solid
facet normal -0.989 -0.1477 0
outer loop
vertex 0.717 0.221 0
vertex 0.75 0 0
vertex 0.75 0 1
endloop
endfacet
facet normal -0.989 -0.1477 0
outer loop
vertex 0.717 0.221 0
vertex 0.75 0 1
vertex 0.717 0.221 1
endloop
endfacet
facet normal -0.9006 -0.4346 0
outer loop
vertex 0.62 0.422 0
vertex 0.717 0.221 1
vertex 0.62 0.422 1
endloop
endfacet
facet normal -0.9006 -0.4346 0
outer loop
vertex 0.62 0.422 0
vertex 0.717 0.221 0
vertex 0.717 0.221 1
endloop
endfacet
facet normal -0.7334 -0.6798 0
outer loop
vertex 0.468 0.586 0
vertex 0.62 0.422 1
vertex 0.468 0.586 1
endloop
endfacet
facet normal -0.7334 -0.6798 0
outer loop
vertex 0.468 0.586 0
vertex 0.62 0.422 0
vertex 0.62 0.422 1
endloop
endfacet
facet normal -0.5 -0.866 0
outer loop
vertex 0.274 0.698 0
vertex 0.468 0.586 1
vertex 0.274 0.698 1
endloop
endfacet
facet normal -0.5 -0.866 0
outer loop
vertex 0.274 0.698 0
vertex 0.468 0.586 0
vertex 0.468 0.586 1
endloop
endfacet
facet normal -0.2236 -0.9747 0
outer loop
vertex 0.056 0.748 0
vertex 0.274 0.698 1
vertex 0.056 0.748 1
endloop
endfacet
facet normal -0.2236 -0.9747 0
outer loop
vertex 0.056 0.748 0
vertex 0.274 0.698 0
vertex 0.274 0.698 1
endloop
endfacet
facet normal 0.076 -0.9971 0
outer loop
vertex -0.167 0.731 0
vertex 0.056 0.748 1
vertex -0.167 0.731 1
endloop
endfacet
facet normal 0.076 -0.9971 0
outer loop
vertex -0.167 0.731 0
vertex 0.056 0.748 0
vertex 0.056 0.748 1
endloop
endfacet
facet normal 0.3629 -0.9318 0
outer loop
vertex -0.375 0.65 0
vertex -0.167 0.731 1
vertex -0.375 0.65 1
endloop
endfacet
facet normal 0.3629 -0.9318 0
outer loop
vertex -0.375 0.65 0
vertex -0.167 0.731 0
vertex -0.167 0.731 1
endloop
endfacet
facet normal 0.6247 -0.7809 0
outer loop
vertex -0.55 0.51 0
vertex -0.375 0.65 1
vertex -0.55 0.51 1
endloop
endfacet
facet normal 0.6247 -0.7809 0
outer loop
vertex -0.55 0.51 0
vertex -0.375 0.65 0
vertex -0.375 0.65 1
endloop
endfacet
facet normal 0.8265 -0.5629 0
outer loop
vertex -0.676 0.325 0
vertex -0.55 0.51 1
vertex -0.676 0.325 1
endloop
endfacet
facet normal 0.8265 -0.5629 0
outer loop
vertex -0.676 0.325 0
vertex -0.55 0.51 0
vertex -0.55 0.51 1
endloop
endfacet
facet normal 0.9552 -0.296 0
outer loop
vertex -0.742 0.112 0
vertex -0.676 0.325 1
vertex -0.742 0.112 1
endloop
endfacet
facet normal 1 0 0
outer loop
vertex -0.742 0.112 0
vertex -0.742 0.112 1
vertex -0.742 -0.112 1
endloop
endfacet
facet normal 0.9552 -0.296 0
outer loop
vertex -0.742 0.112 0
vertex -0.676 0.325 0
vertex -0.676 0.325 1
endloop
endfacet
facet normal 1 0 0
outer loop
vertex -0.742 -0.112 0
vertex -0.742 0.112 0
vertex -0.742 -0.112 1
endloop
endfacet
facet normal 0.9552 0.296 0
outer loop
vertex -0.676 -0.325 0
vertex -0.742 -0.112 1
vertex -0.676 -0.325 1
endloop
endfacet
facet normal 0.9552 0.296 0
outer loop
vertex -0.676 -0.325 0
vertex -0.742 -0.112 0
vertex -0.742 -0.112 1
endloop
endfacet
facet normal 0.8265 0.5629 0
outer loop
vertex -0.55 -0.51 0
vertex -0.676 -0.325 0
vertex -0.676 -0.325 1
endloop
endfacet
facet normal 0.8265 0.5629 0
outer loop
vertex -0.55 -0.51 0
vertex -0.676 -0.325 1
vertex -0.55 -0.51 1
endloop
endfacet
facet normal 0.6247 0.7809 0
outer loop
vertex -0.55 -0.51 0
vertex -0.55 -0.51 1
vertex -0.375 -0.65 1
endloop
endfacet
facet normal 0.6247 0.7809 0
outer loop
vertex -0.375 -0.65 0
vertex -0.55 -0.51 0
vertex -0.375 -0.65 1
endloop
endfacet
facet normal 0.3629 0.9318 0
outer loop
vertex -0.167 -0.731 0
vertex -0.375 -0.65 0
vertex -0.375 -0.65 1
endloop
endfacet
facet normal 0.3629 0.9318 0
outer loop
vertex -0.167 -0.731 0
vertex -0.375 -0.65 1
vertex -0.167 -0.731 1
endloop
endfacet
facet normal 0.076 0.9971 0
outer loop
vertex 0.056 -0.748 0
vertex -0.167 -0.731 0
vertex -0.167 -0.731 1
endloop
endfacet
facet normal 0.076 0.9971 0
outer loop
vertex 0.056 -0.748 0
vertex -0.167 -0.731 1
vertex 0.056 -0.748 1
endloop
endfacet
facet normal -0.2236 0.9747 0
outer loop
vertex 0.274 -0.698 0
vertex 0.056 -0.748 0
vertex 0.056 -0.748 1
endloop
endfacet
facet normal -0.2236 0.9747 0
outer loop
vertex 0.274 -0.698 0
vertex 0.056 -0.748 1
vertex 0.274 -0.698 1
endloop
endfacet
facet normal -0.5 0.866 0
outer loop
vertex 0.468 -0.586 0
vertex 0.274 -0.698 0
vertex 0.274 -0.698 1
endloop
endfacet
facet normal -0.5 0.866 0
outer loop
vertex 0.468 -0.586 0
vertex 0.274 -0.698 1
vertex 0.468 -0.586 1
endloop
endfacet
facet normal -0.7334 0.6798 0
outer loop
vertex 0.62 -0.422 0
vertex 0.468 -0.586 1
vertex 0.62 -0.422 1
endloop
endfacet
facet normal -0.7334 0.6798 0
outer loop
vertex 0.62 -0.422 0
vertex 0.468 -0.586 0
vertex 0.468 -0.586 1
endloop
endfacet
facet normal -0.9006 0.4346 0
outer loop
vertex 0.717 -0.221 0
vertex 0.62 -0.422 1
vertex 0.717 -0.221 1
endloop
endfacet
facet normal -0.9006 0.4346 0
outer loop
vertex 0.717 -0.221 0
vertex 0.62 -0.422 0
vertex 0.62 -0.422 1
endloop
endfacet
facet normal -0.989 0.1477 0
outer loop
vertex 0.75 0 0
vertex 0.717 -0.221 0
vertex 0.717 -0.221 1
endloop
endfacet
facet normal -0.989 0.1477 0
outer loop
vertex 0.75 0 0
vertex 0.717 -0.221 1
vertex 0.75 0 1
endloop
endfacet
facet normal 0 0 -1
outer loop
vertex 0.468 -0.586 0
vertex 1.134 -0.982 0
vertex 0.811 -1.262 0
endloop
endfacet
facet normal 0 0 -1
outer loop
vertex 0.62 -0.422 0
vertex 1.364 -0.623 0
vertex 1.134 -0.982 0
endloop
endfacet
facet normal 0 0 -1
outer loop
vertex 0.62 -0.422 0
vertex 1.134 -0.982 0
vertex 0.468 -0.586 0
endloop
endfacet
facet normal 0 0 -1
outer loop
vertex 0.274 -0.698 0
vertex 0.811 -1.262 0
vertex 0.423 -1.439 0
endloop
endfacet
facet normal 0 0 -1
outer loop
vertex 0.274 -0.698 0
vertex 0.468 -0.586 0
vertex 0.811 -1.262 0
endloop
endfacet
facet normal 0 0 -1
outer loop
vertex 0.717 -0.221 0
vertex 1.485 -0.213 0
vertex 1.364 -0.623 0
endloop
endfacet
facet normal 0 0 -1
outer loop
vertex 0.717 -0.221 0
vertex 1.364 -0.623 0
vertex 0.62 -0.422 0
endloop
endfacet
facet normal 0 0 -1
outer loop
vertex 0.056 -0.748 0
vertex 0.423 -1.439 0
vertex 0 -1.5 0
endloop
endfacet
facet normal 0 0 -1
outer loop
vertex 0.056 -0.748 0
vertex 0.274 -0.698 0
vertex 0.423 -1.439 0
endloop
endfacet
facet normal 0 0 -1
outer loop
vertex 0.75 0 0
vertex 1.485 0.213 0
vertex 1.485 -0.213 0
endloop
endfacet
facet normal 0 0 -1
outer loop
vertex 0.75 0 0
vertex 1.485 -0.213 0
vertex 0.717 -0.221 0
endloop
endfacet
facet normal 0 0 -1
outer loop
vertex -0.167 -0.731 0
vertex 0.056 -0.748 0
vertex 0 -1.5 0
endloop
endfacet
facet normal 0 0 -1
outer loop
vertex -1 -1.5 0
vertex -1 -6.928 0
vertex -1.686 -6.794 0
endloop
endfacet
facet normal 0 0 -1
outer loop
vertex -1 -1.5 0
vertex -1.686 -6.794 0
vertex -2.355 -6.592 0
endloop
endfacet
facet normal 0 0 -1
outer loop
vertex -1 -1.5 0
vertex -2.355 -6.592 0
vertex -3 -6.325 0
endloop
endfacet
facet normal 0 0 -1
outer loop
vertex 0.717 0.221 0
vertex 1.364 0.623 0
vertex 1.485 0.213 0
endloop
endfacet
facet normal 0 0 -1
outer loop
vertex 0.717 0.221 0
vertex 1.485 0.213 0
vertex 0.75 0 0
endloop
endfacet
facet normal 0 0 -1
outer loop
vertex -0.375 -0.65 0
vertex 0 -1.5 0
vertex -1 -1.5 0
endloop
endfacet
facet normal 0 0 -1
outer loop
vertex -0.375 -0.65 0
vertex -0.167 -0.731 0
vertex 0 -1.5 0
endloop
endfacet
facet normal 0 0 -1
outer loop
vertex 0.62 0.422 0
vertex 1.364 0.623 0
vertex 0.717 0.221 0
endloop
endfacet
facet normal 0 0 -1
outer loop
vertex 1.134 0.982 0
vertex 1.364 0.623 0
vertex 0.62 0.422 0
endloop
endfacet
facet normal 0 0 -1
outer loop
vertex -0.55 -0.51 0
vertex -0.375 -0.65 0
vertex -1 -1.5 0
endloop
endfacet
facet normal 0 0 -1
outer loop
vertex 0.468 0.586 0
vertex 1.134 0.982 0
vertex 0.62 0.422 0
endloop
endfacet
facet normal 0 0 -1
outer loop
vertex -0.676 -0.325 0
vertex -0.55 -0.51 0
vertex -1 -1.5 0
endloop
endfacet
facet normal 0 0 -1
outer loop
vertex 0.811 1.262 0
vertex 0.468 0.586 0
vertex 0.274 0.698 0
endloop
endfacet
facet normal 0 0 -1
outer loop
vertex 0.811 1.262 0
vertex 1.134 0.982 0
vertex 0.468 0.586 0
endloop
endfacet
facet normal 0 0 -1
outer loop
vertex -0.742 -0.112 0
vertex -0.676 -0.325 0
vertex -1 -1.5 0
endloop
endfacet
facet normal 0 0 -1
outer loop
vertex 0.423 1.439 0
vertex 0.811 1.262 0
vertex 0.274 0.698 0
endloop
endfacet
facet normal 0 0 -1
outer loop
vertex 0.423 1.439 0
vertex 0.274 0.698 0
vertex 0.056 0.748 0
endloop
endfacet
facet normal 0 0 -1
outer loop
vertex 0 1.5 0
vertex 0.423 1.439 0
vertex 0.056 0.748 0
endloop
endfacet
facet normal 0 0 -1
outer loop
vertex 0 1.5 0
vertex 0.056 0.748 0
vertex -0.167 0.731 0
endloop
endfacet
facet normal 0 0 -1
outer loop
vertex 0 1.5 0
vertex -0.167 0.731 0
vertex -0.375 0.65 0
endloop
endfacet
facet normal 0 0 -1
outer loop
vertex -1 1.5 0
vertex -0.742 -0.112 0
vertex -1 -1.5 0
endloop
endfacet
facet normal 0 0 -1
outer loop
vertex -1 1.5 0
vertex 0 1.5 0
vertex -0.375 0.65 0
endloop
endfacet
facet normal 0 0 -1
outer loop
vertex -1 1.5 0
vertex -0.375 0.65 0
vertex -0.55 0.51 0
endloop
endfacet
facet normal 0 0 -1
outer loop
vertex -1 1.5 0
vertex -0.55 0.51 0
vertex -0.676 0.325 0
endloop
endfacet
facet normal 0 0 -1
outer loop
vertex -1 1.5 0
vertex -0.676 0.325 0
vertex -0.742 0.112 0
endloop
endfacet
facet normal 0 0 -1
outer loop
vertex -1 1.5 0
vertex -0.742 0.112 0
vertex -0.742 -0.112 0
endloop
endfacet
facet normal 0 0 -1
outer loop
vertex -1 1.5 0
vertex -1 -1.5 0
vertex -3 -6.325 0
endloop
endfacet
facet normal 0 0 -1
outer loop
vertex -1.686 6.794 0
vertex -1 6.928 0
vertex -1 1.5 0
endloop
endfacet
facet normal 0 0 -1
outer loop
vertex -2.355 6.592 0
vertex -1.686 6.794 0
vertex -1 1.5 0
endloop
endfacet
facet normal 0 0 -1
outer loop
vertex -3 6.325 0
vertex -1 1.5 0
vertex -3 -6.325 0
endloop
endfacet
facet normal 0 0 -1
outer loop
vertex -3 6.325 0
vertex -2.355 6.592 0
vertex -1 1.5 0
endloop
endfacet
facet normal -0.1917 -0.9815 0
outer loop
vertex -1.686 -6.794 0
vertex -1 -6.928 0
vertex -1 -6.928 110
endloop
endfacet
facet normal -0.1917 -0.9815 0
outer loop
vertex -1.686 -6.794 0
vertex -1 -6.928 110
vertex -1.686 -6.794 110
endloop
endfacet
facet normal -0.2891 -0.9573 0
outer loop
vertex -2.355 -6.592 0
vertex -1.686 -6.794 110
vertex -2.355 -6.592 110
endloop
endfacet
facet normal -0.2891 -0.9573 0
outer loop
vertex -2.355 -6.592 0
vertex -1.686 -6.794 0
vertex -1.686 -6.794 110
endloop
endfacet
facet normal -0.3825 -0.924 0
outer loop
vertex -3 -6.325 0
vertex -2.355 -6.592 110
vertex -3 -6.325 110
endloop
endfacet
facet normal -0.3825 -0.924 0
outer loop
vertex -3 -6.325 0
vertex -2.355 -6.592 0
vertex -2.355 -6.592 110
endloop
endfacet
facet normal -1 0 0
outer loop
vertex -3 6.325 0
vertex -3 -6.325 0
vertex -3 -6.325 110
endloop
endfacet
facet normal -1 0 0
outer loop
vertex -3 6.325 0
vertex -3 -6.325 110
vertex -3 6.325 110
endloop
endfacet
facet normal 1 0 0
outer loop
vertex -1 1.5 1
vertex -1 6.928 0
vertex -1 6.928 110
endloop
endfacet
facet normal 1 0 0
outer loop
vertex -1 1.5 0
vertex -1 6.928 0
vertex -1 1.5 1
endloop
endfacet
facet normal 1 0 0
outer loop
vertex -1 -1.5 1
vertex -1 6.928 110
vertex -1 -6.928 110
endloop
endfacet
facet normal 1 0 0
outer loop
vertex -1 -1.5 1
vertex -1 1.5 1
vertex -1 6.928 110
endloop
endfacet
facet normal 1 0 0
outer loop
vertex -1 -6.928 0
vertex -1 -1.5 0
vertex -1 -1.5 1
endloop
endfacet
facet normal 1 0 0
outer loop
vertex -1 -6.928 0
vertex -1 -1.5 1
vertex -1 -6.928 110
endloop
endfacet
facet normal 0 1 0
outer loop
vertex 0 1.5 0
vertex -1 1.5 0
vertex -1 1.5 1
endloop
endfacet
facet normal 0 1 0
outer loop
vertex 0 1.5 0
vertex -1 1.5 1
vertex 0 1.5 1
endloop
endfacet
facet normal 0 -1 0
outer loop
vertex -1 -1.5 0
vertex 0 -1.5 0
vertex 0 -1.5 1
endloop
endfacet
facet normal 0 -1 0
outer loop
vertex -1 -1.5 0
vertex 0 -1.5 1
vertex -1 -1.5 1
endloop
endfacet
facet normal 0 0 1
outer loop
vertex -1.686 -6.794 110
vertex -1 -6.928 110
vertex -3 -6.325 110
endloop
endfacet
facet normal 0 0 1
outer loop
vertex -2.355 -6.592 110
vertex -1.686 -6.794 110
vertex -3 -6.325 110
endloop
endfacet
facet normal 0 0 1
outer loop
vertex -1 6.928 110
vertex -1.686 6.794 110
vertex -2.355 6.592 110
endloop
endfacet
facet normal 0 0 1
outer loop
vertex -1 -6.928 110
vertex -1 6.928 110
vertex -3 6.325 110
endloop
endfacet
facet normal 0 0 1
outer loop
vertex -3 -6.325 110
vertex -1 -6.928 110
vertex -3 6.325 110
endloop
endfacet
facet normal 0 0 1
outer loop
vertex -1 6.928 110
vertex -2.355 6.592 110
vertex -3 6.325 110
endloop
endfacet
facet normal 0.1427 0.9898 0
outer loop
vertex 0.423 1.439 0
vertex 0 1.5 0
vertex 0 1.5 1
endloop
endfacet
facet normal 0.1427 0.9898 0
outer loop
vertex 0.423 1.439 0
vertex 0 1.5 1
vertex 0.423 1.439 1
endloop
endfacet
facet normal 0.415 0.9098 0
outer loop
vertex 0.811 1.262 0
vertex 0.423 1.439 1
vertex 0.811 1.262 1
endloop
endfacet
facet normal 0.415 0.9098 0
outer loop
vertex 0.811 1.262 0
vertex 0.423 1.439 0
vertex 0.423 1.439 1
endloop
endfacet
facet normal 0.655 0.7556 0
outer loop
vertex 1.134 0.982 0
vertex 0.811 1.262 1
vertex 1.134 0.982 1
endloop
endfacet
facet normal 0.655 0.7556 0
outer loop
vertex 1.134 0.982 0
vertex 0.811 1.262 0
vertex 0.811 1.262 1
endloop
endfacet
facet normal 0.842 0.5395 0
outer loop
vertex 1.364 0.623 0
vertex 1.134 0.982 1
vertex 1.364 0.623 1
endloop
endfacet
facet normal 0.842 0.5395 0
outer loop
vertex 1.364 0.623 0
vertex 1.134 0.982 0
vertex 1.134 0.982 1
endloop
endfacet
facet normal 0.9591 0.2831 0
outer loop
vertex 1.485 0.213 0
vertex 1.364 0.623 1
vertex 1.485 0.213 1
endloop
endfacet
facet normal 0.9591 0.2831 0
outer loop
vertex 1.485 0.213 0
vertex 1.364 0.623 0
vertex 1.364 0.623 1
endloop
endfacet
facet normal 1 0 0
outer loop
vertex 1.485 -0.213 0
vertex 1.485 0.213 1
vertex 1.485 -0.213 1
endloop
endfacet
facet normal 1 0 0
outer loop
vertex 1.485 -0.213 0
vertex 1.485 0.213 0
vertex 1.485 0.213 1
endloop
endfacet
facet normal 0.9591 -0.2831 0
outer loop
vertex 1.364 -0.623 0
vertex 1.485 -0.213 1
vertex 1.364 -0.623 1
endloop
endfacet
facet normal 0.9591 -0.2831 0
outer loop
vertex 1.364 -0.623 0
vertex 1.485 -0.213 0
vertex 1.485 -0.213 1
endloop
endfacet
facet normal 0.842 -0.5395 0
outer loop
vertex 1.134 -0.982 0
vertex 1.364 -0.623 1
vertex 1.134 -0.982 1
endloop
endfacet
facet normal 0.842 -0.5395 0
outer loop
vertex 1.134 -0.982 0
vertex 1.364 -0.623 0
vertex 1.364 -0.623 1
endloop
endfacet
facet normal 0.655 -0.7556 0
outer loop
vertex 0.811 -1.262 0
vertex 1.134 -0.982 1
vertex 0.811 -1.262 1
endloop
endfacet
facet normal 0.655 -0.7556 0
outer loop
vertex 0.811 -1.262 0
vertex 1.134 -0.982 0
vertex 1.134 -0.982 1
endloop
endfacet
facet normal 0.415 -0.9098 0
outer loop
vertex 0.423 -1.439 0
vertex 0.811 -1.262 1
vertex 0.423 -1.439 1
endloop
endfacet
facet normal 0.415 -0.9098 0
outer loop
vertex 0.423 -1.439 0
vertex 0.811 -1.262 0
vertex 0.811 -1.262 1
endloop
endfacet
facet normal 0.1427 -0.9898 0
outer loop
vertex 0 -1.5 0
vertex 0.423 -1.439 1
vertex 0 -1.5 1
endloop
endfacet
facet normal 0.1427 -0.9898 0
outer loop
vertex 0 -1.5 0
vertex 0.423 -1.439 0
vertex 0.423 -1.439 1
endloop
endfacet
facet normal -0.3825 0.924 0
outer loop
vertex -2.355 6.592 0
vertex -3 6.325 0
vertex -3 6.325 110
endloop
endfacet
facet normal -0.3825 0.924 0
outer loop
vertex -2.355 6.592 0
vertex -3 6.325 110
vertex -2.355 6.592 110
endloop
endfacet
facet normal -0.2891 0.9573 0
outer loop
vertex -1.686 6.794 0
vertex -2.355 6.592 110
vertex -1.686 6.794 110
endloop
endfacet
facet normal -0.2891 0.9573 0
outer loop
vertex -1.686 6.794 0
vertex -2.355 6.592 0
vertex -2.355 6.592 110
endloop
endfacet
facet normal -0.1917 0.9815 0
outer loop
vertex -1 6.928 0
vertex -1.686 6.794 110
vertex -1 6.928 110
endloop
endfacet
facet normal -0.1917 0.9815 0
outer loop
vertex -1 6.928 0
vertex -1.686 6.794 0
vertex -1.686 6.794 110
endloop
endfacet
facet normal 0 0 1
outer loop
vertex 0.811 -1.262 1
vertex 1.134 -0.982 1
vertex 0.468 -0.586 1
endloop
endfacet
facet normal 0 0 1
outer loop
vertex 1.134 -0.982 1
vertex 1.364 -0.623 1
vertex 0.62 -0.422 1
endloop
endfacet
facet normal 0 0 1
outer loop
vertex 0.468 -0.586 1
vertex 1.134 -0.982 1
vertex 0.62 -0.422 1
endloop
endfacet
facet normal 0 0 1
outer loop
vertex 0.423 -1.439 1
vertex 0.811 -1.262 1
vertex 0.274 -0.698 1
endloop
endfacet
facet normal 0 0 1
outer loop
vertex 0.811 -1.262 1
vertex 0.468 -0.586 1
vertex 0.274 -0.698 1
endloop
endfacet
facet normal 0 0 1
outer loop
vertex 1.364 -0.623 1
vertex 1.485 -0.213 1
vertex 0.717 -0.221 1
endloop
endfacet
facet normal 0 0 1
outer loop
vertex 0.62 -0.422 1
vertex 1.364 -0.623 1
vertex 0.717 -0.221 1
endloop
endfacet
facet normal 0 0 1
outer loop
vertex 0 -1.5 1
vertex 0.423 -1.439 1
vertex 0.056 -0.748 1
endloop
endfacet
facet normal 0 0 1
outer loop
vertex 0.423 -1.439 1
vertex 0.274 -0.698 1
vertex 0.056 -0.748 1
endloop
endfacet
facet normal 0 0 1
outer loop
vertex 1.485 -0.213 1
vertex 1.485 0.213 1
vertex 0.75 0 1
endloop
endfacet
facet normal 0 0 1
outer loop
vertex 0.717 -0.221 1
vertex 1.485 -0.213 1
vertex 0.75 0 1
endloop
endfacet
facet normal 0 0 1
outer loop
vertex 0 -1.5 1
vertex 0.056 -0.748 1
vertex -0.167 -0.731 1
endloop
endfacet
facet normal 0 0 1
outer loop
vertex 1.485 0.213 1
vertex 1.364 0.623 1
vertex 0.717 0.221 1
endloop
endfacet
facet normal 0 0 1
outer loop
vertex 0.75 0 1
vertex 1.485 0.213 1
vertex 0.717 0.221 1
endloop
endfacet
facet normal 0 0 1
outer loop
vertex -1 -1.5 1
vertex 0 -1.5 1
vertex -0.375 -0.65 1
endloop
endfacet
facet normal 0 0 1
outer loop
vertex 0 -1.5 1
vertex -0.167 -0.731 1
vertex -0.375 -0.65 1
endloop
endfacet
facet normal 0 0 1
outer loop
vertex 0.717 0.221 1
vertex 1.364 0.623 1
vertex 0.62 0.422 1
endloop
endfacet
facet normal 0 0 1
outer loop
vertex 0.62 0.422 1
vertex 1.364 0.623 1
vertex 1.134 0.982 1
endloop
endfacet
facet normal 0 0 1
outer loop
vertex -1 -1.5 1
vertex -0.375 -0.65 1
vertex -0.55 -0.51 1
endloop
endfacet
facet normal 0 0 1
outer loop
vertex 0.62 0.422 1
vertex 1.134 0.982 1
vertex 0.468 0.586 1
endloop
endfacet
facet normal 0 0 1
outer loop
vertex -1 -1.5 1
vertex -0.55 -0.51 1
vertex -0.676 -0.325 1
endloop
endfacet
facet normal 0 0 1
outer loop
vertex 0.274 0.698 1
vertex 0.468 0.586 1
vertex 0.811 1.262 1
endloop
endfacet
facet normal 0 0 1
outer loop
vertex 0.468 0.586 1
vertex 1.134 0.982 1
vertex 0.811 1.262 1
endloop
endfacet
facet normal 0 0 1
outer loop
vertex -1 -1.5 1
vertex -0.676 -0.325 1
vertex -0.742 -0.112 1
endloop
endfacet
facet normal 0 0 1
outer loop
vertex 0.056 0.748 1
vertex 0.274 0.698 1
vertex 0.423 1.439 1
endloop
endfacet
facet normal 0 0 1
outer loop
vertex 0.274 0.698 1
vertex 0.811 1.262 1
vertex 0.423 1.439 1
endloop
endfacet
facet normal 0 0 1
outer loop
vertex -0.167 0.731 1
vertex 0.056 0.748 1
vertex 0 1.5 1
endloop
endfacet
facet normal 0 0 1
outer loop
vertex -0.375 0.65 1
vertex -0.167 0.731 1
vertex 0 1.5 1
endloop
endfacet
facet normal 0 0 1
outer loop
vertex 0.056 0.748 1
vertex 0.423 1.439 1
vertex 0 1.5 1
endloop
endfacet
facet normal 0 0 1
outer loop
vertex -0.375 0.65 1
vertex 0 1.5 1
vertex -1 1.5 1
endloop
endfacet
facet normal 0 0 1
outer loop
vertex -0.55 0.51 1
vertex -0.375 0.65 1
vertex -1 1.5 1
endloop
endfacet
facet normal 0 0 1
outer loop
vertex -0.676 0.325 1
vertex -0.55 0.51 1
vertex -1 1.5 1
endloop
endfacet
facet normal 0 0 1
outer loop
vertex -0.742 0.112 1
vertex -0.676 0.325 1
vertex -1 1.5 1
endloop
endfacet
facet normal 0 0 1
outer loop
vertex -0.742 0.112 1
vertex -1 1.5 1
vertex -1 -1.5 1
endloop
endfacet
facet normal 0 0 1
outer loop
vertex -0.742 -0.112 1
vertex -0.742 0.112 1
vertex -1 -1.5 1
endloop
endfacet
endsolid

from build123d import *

# Parameters (mm, degrees)
EXTRUDE_1_DEPTH = 110
SKETCH_1_4_R    = 0.75
EXTRUDE_2_DEPTH = 1


with BuildPart() as part:
    # Sketch 1 → Extrude 1 (new body)
    with BuildSketch(Plane.XY):
        with BuildLine():
            Line((-1, 6.92820323), (-1, 1.5))
            Line((-1, 1.5), (-1, -1.5))
            Line((-1, -1.5), (-1, -6.92820323))
            ThreePointArc((-1, -6.92820323), (-2.022646212, -6.701410471), (-3, -6.32455532))
            Line((-3, -6.32455532), (-3, 6.32455532))
            ThreePointArc((-3, 6.32455532), (-2.022646212, 6.701410471), (-1, 6.92820323))
        make_face()
    extrude(amount=EXTRUDE_1_DEPTH)

    # Sketch 1_4 → Extrude 2 (add)
    with BuildSketch(Plane.XY):
        with BuildLine():
            Line((0, -1.5), (-1, -1.5))
            Line((-1, -1.5), (-1, 1.5))
            Line((-1, 1.5), (0, 1.5))
            ThreePointArc((0, 1.5), (1.5, 0), (0, -1.5))
        make_face()
        Circle(SKETCH_1_4_R, mode=Mode.SUBTRACT)
    extrude(amount=EXTRUDE_2_DEPTH)


solid = part.part
